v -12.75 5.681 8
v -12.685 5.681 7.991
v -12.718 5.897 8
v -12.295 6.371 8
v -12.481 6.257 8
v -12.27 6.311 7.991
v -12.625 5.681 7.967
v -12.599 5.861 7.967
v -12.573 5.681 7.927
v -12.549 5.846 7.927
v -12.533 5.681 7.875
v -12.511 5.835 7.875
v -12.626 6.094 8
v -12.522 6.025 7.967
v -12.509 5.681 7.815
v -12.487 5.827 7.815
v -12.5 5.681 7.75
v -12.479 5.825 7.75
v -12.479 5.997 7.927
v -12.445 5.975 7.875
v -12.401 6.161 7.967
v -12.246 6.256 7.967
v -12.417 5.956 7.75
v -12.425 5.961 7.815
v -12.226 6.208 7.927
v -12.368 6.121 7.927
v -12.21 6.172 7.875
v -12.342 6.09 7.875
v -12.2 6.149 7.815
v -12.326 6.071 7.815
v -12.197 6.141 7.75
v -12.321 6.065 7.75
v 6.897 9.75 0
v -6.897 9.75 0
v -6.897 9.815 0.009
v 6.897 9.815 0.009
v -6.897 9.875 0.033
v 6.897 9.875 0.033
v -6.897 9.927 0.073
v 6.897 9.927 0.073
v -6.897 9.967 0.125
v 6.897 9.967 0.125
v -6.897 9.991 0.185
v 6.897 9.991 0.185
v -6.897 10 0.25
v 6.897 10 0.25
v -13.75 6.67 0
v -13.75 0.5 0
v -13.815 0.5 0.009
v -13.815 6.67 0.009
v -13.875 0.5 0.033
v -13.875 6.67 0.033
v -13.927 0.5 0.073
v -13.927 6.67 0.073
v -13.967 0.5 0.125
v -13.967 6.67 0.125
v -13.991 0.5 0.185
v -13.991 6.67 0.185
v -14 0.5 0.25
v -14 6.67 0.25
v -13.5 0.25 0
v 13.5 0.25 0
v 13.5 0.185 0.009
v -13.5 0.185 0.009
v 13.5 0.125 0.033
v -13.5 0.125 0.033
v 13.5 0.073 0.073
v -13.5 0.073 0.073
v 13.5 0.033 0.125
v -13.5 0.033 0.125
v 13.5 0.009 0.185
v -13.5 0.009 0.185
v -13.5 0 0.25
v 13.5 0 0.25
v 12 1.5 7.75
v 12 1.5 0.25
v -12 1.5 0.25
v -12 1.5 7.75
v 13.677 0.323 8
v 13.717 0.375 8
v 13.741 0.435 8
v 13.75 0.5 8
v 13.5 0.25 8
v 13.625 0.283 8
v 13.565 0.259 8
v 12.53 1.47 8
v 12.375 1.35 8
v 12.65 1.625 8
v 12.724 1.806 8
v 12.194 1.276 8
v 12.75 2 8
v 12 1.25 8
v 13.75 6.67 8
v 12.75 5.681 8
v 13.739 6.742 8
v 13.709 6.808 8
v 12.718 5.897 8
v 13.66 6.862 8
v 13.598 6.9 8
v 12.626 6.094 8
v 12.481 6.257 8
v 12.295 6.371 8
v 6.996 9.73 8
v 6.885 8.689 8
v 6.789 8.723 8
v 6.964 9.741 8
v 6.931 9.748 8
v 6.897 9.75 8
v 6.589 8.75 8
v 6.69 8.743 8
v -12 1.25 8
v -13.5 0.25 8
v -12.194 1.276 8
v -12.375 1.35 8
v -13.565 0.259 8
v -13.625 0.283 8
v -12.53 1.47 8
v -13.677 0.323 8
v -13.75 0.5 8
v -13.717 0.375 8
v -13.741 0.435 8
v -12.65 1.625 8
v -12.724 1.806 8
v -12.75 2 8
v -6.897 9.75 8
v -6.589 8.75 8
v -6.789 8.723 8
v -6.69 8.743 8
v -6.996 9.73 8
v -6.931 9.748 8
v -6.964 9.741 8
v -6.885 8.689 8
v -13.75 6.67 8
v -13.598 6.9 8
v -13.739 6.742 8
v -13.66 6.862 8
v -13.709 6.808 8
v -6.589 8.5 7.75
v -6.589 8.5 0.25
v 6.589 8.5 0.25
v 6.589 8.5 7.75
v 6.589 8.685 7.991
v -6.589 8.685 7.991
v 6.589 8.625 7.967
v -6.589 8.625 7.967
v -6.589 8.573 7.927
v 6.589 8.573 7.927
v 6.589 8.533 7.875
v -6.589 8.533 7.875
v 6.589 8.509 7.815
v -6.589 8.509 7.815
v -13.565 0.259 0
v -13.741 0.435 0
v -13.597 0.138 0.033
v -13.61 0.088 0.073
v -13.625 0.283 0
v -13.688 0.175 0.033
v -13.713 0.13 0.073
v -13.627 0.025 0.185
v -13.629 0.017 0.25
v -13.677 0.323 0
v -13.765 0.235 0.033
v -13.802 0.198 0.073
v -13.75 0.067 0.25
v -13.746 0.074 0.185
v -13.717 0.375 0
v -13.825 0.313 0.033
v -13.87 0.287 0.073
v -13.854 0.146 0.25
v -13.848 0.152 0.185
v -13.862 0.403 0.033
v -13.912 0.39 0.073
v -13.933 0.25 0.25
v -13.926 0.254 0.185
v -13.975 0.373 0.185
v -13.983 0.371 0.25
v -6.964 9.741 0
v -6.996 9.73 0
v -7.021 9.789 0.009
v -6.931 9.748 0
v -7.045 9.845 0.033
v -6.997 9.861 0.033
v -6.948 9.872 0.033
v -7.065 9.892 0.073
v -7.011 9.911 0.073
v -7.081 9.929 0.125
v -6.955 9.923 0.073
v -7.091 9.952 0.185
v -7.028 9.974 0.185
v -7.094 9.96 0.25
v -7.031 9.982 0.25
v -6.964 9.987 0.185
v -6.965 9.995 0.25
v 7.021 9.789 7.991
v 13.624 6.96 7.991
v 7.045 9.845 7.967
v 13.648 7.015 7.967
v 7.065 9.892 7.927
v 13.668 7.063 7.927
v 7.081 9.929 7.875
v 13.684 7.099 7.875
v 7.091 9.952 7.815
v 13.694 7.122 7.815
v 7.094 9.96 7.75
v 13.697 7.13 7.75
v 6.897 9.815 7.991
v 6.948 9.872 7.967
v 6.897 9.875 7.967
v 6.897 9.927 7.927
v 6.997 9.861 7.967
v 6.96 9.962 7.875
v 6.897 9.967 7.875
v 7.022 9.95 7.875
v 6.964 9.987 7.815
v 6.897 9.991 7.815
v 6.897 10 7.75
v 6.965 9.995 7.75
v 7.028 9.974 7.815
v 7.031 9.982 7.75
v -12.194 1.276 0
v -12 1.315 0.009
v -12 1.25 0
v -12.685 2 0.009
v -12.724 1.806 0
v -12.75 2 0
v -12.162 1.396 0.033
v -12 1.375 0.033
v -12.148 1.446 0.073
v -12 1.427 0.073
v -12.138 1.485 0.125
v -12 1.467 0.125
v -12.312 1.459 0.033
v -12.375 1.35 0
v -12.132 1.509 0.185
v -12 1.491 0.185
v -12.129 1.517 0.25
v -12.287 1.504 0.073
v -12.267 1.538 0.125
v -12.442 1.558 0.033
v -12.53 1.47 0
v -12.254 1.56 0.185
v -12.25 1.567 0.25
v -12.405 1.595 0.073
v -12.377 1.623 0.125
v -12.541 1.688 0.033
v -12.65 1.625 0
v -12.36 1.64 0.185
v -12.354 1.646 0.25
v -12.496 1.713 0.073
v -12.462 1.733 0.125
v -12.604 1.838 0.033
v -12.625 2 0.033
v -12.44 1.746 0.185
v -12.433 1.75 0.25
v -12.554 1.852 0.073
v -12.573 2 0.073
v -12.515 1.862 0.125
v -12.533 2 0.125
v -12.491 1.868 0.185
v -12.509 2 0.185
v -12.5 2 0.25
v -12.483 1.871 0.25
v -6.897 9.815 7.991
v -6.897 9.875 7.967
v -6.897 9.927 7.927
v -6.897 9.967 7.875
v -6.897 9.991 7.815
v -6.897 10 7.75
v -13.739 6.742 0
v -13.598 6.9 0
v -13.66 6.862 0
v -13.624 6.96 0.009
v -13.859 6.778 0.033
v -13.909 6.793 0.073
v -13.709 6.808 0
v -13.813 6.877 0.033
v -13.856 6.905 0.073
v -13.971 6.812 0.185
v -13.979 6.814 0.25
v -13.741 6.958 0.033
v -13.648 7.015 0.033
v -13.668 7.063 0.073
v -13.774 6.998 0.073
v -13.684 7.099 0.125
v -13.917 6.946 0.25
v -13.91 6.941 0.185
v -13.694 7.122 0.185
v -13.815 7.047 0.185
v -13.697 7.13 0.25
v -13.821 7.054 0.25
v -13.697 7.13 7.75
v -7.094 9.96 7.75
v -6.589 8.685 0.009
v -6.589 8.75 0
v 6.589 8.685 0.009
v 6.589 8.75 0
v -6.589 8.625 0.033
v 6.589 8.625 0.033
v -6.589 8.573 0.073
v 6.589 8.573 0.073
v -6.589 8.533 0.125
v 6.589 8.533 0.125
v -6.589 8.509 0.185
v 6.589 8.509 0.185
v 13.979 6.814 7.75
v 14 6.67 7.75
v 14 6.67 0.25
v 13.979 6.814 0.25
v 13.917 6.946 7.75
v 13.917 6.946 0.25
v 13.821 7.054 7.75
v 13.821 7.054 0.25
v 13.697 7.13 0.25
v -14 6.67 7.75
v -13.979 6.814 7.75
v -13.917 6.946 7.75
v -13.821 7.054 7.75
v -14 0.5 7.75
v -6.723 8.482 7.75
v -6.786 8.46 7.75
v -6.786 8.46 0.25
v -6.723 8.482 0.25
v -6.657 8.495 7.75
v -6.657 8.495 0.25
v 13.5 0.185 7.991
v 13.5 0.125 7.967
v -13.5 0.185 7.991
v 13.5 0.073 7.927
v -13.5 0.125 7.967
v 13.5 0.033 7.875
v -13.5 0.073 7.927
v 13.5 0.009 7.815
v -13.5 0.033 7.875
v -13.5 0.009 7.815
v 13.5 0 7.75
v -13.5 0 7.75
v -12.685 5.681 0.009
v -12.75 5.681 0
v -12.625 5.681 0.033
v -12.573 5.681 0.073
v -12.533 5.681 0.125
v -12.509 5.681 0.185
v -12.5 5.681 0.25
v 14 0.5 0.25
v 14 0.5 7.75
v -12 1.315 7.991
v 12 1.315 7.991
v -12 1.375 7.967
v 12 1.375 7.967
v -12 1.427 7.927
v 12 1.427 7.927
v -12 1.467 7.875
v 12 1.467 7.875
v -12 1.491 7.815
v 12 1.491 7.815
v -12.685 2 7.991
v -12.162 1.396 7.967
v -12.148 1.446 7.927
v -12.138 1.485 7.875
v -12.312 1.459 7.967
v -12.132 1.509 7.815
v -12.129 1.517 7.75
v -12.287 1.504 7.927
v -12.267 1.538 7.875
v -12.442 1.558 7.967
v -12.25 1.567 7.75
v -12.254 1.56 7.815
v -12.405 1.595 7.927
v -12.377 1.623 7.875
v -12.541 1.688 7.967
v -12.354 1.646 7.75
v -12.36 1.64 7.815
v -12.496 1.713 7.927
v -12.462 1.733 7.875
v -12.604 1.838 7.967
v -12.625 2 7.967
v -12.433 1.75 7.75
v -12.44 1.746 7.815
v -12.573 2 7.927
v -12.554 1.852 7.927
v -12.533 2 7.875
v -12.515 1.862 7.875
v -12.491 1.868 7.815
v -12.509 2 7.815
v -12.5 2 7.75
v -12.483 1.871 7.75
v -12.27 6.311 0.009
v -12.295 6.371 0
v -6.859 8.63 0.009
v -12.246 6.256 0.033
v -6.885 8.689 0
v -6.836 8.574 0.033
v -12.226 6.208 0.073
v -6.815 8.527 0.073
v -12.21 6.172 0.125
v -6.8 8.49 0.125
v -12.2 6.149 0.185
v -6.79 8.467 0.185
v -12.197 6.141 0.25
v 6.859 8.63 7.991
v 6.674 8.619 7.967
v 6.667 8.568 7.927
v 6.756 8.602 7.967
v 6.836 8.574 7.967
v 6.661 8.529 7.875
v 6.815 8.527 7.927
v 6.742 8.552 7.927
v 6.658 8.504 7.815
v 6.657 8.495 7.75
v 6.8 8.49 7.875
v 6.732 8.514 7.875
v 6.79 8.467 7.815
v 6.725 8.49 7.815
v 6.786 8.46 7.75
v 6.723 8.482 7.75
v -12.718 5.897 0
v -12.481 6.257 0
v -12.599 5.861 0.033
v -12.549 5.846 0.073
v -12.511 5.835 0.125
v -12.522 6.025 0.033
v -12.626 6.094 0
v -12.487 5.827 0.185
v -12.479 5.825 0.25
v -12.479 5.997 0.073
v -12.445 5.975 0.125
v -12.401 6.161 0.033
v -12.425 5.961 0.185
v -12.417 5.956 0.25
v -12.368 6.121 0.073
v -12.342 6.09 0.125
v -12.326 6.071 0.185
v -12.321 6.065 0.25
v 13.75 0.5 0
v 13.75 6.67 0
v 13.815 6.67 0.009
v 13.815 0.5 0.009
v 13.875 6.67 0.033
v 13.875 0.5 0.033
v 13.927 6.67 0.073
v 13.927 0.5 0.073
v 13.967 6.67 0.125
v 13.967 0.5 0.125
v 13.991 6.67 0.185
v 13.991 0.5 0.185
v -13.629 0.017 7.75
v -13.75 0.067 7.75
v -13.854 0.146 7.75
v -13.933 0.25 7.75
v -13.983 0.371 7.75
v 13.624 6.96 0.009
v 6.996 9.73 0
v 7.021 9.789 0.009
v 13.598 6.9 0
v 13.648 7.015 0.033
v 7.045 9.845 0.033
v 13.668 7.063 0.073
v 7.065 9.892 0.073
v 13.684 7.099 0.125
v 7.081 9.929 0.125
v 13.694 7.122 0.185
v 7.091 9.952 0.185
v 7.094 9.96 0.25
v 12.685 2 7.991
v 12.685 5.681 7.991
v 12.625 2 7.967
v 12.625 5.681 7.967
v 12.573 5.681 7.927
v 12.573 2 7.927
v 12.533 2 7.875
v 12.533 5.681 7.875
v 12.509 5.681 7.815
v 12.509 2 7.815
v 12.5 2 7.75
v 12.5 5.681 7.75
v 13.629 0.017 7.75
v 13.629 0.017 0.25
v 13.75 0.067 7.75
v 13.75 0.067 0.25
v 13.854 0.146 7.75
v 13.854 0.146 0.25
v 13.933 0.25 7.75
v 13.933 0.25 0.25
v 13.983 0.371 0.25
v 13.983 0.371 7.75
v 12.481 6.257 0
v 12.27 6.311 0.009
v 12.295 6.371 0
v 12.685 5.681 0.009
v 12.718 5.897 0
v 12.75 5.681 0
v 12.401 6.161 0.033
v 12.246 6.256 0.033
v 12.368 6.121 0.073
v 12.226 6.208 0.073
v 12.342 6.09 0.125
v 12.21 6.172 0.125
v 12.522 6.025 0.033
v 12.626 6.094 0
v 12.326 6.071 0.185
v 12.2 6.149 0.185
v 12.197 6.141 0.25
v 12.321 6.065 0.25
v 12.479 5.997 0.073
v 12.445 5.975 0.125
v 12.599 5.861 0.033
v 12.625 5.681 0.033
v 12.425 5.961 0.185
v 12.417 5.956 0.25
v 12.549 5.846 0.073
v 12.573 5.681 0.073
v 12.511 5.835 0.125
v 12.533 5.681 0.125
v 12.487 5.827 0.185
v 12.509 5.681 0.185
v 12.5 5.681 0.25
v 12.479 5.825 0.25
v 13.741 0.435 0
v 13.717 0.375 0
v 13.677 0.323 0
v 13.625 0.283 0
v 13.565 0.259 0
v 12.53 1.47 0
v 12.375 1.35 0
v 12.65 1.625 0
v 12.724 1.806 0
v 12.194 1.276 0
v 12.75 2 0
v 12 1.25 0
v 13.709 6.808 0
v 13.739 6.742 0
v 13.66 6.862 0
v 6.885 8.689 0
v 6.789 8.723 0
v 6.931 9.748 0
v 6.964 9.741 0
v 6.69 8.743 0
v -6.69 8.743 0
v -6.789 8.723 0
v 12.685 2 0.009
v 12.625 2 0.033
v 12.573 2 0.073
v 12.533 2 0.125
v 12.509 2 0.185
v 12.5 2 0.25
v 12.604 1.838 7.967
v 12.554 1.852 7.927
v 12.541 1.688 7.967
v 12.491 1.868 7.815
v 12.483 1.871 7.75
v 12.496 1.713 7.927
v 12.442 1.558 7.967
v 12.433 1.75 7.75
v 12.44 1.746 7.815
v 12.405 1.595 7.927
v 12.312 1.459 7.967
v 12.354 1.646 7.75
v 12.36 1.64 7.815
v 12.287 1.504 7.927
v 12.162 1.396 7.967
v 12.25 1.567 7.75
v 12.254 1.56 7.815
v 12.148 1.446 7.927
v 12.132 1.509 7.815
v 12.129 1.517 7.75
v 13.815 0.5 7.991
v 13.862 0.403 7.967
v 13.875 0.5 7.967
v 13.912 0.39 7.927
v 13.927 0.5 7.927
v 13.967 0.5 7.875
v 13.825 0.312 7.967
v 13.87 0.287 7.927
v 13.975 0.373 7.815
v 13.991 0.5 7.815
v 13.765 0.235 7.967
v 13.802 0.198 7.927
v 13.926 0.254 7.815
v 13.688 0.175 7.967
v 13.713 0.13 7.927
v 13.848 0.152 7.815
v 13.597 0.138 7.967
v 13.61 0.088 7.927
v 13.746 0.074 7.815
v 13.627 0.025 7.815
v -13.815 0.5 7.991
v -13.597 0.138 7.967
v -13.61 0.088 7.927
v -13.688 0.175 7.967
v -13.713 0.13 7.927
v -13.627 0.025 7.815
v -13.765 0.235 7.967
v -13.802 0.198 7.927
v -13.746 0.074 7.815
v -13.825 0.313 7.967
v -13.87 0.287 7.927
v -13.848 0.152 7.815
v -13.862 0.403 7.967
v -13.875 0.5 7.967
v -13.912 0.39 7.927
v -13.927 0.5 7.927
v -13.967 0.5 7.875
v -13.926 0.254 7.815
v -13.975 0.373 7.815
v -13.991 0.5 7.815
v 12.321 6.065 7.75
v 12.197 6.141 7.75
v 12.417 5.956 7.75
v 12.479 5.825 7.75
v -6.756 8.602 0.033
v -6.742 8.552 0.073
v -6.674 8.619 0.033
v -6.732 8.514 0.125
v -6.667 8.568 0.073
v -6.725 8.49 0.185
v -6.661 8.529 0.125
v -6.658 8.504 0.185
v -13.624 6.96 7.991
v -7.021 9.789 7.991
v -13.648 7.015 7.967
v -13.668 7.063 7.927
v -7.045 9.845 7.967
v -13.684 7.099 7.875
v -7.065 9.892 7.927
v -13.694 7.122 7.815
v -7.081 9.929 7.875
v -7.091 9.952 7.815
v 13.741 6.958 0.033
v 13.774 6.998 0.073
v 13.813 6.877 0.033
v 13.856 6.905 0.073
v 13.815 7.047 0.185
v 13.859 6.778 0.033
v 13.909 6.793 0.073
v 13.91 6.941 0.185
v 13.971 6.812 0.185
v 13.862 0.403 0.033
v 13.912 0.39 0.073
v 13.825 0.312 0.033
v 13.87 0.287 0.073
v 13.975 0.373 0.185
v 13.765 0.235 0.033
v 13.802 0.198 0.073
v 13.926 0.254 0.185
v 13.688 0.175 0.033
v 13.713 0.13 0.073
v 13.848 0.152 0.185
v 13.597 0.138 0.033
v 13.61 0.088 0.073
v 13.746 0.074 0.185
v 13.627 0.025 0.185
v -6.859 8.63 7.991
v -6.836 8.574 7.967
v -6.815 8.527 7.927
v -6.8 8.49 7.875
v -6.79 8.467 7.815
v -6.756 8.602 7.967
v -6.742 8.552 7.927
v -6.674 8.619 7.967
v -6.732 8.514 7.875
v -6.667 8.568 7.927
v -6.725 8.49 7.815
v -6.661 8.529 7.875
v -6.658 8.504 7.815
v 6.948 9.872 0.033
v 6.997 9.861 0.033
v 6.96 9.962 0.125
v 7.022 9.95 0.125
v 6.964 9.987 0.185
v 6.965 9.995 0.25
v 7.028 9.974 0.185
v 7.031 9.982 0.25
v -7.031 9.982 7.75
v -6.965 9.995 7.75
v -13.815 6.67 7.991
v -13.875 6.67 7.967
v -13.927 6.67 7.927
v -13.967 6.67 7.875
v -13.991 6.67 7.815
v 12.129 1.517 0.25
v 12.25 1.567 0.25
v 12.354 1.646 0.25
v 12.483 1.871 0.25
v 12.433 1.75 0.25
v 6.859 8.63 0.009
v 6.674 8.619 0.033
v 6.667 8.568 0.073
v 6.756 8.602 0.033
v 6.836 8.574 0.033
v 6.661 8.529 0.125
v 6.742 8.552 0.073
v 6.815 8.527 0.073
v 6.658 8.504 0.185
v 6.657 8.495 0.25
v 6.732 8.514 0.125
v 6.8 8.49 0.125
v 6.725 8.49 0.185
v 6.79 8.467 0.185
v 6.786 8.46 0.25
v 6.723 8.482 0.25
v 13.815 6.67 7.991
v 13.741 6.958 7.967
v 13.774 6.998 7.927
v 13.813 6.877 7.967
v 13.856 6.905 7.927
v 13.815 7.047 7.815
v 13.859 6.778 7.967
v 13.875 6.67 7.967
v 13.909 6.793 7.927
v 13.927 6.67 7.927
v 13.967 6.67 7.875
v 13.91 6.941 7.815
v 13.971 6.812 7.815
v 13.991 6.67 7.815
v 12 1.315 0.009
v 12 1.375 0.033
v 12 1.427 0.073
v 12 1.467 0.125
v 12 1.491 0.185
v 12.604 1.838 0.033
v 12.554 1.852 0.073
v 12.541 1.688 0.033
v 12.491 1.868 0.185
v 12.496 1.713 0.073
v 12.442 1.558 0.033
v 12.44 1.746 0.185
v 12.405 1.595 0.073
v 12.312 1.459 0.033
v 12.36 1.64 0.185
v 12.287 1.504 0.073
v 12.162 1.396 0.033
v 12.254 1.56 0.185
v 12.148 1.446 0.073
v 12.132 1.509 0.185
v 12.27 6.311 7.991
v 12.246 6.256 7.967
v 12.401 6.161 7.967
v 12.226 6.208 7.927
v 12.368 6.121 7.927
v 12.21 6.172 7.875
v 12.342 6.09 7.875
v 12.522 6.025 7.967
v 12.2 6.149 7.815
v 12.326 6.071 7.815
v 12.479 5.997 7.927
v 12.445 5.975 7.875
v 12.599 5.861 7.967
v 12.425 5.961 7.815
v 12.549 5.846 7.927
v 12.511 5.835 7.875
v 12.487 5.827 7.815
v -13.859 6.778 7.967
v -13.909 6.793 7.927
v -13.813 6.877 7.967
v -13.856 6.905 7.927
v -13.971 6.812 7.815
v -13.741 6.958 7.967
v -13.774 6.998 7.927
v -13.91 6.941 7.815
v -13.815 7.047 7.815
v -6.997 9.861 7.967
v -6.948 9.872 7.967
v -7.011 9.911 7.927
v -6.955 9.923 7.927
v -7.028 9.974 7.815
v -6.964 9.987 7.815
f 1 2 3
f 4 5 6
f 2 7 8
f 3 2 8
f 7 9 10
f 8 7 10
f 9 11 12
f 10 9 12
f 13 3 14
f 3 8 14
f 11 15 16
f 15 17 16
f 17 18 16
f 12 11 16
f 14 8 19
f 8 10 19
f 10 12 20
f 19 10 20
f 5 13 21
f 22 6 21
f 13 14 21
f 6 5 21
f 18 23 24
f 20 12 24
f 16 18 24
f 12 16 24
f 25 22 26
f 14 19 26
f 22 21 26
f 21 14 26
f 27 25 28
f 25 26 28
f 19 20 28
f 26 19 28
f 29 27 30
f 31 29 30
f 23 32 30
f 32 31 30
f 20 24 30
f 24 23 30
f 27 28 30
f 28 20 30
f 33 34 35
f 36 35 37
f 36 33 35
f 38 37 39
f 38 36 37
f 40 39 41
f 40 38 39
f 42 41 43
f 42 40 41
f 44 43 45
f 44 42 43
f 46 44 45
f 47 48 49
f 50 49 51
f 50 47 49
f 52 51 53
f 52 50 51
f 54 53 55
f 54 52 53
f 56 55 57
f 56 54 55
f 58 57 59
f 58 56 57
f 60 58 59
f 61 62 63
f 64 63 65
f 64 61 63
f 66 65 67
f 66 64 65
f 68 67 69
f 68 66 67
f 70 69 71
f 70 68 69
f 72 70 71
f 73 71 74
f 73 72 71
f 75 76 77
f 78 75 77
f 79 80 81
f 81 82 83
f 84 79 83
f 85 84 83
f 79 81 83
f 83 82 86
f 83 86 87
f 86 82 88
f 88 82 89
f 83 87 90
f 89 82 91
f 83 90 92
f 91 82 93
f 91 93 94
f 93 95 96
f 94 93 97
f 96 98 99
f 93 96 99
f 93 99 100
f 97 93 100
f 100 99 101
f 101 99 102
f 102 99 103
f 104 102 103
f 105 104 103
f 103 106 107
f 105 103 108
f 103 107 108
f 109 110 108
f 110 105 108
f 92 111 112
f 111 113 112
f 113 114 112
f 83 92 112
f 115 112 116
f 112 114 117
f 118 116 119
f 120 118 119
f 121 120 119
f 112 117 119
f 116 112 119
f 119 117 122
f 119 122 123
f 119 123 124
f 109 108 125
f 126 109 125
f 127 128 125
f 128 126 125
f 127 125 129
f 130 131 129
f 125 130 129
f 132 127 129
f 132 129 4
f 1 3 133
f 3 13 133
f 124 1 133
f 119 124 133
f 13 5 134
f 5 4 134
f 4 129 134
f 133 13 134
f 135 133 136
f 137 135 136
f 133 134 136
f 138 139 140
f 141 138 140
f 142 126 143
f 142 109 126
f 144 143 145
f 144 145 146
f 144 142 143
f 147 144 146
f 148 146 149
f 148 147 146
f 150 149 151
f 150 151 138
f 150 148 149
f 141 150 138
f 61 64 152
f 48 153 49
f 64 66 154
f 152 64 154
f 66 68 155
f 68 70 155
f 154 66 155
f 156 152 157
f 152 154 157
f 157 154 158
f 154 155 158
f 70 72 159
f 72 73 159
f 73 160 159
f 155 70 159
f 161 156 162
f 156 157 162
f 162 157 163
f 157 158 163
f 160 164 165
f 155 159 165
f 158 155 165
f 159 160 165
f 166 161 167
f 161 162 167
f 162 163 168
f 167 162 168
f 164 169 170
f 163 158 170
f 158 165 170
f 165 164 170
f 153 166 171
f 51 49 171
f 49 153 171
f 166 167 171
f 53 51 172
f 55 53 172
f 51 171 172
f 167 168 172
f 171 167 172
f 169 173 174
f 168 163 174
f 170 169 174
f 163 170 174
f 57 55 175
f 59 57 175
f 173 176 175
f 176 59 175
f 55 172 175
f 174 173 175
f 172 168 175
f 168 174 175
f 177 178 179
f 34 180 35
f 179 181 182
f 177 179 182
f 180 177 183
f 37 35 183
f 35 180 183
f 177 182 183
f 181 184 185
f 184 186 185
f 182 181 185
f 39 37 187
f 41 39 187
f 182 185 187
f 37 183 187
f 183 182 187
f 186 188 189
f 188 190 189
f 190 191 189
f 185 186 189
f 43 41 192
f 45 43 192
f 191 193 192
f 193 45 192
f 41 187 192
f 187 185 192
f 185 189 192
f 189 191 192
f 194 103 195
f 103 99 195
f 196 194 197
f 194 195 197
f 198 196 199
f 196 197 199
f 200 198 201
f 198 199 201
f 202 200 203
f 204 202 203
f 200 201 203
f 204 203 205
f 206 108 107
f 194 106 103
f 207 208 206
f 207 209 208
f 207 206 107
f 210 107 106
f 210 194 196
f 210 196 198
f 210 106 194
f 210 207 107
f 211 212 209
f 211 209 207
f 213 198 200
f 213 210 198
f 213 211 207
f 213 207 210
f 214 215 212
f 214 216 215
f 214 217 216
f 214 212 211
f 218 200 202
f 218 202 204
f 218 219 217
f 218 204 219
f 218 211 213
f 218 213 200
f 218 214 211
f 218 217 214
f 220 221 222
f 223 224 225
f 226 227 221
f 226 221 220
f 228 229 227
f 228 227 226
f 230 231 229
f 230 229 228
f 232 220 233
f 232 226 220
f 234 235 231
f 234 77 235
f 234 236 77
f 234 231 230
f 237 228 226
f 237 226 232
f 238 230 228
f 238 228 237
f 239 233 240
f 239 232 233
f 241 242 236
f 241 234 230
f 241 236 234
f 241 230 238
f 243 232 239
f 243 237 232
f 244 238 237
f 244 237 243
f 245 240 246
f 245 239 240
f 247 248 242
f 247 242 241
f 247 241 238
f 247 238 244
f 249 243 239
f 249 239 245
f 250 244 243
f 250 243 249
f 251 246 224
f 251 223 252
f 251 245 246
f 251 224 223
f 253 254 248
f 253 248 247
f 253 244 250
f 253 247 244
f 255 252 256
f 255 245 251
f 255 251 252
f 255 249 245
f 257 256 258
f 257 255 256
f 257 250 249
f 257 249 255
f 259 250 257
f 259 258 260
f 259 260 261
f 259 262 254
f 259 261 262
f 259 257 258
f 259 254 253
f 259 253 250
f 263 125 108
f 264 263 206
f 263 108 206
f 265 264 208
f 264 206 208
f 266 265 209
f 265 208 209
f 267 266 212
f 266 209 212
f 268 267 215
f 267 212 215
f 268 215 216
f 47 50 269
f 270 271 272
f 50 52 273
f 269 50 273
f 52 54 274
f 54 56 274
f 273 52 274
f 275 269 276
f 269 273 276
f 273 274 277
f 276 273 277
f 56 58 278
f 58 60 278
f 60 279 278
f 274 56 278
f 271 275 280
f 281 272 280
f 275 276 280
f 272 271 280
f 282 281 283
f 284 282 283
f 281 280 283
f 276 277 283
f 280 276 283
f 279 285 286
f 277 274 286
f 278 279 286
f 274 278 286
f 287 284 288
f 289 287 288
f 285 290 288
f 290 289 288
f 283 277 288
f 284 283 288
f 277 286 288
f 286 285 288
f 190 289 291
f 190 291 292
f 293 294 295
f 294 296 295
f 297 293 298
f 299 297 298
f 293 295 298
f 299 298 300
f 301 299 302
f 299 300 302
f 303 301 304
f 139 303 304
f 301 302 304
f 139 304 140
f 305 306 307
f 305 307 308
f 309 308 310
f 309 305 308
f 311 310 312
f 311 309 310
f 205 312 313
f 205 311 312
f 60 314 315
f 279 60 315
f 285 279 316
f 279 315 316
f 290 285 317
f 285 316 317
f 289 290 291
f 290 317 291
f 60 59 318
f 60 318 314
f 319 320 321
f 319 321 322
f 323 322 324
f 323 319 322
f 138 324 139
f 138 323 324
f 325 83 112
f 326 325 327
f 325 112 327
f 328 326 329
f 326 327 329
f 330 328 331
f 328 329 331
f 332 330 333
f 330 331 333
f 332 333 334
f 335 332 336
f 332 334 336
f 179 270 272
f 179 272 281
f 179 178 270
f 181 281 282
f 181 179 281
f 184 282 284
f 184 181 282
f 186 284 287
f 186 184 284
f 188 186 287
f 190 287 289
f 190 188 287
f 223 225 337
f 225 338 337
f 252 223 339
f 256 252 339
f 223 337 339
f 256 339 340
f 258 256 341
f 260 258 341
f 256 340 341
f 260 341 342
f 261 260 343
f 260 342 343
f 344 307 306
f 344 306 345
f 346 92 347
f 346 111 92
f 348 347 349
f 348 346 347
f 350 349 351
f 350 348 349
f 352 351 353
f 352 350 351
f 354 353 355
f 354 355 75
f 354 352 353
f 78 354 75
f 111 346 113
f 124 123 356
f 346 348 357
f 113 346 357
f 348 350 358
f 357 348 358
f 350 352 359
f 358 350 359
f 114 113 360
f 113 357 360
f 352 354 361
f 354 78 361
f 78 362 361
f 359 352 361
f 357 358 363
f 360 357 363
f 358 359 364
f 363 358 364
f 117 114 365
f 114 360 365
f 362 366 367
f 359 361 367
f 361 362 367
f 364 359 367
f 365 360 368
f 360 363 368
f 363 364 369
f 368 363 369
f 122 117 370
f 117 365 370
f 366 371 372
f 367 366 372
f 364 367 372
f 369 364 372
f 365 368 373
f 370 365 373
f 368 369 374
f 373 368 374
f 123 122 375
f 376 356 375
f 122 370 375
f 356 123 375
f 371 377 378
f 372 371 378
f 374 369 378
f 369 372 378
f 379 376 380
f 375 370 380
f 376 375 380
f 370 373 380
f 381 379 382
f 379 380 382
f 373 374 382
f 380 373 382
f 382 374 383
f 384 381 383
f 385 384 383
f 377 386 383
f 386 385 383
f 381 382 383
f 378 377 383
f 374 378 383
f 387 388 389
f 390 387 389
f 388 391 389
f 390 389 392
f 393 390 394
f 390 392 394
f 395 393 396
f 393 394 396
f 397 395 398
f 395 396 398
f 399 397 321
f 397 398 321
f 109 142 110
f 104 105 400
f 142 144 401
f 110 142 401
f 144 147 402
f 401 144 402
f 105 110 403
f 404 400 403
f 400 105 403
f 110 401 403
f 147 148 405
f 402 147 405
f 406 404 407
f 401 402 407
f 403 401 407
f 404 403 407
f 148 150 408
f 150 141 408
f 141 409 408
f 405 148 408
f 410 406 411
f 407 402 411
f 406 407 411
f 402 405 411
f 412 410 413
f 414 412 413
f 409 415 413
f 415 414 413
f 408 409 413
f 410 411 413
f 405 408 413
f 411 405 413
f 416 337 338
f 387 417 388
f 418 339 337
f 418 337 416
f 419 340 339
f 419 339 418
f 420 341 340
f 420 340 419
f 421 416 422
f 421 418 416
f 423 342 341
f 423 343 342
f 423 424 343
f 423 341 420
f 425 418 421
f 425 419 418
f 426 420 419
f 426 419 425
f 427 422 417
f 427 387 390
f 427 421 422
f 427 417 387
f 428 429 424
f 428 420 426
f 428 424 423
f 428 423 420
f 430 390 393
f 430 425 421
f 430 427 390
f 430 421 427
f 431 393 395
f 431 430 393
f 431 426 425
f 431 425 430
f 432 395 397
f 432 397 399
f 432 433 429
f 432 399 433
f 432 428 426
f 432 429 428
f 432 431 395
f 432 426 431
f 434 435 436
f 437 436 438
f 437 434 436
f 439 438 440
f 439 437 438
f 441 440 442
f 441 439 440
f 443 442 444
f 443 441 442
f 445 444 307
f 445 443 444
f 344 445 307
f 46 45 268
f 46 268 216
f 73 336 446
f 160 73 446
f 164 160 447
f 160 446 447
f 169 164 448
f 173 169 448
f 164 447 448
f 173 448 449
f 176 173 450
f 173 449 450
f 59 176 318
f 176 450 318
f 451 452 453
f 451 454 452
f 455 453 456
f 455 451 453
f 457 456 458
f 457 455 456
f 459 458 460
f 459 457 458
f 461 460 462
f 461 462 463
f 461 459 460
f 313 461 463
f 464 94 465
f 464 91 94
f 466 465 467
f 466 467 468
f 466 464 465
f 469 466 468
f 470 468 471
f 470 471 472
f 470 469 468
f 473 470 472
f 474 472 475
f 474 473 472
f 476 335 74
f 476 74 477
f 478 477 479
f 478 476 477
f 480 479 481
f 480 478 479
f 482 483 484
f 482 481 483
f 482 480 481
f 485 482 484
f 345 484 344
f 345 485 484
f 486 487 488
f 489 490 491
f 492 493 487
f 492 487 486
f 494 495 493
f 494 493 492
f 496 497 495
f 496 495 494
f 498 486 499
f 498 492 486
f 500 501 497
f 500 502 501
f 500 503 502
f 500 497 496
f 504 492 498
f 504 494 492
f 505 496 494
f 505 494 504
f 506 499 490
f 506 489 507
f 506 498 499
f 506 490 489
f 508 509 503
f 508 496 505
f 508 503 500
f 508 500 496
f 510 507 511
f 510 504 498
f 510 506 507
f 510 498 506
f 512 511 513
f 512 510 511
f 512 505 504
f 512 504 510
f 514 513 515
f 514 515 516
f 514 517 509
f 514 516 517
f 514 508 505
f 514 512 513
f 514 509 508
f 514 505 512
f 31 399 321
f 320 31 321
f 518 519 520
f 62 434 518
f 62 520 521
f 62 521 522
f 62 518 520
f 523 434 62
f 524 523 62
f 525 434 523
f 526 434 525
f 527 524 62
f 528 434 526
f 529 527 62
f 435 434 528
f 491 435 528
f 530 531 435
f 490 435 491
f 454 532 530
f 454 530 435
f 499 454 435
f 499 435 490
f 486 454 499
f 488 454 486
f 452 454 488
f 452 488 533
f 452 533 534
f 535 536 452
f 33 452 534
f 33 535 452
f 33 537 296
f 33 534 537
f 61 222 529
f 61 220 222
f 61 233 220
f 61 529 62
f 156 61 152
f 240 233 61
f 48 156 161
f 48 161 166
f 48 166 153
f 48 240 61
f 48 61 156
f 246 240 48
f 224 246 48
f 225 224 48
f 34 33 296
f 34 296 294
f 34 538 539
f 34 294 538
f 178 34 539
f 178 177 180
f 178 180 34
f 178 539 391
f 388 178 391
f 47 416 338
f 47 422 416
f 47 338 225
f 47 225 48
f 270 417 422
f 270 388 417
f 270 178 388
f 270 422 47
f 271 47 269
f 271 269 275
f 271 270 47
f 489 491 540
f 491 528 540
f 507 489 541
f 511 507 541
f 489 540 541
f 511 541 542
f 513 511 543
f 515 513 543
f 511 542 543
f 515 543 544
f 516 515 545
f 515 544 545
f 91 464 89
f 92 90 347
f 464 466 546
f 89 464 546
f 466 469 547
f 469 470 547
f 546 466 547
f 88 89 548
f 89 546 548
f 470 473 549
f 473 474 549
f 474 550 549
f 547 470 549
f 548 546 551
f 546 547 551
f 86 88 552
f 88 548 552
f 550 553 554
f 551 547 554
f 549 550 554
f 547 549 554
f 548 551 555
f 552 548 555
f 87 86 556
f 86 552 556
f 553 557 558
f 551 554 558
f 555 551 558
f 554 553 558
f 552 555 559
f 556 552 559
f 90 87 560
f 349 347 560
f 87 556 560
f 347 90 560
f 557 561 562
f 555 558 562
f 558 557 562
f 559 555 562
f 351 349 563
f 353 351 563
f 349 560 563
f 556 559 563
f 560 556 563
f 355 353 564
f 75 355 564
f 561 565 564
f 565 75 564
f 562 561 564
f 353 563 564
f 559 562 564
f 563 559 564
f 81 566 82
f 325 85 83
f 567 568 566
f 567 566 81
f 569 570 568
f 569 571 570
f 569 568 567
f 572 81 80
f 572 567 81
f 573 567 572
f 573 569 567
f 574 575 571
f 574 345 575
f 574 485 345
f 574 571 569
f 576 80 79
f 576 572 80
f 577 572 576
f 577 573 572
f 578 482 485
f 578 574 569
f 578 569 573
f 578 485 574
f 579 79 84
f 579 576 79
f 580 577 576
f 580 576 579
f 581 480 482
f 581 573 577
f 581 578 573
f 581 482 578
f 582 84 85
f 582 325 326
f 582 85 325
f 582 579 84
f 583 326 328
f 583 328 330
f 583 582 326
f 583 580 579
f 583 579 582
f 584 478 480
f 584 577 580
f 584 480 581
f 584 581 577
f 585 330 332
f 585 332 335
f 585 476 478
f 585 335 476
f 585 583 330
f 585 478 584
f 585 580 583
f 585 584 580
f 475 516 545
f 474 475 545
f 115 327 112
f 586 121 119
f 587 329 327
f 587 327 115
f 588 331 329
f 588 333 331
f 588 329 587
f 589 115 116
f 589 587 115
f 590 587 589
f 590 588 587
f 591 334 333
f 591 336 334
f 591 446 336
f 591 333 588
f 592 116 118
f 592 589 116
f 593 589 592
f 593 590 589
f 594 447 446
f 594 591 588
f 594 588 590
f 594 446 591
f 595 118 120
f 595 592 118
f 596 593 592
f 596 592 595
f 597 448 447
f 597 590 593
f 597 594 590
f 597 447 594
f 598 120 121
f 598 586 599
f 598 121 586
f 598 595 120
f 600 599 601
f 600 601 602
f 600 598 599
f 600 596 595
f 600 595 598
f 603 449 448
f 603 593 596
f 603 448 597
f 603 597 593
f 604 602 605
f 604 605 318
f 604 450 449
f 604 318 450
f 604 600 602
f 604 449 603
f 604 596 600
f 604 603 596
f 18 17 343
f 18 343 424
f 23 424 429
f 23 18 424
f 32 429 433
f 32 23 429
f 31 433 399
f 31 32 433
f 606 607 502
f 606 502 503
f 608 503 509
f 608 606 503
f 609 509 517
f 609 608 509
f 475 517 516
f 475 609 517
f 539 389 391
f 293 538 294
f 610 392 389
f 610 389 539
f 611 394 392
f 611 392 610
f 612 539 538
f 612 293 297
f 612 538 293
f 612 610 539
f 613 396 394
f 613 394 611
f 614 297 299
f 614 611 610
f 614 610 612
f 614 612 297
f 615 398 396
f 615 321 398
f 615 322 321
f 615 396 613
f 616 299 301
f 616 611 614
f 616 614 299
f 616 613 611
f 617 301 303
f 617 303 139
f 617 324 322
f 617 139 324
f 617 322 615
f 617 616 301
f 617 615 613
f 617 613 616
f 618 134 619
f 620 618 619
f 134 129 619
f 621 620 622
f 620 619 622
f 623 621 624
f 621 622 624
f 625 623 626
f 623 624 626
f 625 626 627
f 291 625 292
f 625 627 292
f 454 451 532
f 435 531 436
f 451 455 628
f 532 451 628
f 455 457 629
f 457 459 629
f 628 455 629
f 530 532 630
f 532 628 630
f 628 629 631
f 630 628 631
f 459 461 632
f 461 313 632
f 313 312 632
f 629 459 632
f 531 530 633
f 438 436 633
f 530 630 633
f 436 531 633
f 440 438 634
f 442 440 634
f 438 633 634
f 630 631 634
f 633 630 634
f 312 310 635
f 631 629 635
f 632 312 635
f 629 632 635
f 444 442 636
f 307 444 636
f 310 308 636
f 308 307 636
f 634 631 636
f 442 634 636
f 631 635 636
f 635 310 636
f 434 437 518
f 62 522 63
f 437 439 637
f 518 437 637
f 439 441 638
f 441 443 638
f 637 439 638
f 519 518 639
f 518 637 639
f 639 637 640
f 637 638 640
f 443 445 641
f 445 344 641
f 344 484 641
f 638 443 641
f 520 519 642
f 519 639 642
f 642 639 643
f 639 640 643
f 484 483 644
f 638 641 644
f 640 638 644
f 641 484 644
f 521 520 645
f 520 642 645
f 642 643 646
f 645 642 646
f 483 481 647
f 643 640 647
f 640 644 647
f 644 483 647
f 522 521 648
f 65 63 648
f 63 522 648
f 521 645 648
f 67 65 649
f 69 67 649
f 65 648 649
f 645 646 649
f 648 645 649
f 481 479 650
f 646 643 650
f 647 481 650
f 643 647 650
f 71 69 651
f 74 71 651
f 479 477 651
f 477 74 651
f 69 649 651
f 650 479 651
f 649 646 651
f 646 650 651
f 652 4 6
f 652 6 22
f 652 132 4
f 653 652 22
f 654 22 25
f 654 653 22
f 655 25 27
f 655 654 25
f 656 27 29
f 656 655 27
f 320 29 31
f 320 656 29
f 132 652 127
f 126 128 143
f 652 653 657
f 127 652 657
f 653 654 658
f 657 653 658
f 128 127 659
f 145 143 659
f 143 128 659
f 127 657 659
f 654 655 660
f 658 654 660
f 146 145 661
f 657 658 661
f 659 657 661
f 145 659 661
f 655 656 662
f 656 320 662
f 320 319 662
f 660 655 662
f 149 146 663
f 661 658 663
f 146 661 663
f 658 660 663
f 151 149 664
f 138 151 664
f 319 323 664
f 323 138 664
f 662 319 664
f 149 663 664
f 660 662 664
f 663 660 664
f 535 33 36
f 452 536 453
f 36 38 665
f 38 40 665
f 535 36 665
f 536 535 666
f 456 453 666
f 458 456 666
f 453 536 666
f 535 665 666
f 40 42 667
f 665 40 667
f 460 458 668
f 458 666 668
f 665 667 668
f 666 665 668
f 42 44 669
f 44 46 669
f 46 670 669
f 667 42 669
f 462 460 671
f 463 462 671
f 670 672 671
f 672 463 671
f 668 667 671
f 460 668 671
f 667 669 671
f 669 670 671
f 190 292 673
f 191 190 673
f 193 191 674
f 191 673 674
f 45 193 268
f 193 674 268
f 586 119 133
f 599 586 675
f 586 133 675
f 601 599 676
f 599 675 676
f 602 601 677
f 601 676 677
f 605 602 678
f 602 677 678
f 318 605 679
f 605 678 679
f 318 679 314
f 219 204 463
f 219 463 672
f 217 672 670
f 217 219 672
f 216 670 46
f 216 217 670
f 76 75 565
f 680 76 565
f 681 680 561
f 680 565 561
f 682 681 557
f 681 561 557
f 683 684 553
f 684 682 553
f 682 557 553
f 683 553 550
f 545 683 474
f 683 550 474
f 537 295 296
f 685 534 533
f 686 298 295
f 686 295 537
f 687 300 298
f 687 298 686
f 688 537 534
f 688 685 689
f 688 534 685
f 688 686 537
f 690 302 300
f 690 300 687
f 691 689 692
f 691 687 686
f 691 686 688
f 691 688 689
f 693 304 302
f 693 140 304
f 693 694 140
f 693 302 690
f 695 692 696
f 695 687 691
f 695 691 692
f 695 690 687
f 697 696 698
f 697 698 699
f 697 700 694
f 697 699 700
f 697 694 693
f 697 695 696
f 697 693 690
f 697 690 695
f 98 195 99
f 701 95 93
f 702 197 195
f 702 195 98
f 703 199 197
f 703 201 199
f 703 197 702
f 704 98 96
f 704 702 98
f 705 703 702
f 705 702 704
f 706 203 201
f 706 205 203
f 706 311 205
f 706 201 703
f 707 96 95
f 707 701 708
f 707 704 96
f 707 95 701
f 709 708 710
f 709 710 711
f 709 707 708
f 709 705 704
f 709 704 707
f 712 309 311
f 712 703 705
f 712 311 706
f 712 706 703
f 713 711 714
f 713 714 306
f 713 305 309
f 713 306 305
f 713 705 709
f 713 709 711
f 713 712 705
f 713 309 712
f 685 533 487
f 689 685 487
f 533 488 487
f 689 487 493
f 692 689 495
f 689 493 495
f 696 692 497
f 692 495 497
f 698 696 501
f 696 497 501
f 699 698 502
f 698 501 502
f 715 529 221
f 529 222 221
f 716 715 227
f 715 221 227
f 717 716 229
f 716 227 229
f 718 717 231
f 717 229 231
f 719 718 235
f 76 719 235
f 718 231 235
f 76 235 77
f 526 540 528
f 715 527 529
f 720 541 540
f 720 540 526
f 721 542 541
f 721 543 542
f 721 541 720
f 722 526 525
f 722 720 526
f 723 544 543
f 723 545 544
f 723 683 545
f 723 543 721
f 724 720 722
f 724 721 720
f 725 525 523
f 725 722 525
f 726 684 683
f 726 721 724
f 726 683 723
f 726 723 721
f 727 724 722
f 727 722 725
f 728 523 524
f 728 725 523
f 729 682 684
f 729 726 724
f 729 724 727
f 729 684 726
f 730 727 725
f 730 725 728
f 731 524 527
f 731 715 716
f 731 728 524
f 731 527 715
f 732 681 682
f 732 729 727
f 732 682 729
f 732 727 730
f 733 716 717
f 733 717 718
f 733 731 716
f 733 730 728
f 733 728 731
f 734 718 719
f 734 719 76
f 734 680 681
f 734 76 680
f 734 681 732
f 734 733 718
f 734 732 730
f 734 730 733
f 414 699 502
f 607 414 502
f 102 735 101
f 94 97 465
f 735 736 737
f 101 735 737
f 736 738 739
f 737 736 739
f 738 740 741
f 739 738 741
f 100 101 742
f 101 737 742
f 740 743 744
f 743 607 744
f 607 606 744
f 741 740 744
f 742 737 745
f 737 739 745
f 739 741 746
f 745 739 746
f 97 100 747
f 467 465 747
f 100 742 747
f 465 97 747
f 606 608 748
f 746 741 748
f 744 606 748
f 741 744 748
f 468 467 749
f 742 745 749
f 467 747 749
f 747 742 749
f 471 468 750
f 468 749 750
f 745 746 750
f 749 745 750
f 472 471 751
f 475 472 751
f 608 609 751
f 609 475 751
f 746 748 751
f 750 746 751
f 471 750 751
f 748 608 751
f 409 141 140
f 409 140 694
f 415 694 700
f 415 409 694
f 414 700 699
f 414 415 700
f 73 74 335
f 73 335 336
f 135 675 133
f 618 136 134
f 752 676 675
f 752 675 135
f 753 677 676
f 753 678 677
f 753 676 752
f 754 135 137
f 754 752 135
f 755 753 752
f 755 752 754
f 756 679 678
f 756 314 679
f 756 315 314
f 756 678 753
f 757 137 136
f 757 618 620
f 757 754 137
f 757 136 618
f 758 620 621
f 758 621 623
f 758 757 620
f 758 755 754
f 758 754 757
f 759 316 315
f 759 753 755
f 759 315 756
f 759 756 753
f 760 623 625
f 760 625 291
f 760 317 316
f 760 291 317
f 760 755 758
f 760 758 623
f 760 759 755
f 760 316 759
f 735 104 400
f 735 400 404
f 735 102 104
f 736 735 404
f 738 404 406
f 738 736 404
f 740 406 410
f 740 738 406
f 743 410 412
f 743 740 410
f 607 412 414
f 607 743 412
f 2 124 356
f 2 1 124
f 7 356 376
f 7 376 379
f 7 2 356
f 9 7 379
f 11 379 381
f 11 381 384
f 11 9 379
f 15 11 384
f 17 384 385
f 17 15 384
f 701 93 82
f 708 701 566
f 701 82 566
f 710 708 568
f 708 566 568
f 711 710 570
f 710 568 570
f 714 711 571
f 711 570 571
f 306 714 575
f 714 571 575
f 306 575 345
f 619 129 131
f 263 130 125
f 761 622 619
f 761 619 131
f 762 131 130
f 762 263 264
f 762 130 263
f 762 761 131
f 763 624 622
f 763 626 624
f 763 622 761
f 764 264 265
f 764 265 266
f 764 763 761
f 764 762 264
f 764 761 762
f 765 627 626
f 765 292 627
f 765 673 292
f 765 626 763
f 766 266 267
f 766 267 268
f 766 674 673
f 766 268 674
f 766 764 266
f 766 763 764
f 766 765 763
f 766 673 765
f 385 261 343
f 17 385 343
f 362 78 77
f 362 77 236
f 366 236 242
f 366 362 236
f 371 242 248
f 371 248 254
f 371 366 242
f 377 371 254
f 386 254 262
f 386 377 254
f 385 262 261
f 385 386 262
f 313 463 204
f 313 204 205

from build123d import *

# Parameters (mm, degrees)
BOSS_EXTRUDE1_DEPTH = 8
FILLET1_R           = 0.5
FILLET2_R           = 0.25


with BuildPart() as part:
    # Sketch1 → Boss-Extrude1 (new body)
    with BuildSketch(Plane.XY):
        Polygon((14, 0), (-14, 0), (-14, 7), (-7, 10), (7, 10), (14, 7), align=None)
        Polygon((12.5, 1.5), (-12.5, 1.5), (-12.5, 6.010905763), (-6.692113447, 8.5), (6.692113447, 8.5), (12.5, 6.010905763), align=None, mode=Mode.SUBTRACT)
    extrude(amount=BOSS_EXTRUDE1_DEPTH)

    # Fillet1
    fillet1_edges = [part.edges().sort_by_distance(p)[0] for p in [
        (14, 0, 4),
        (-14, 0, 4),
        (-14, 7, 4),
        (-7, 10, 4),
        (7, 10, 4),
        (14, 7, 4),
        (12.5, 1.5, 4),
        (12.5, 6.010905763, 4),
        (6.692113447, 8.5, 4),
        (-6.692113447, 8.5, 4),
        (-12.5, 6.010905763, 4),
        (-12.5, 1.5, 4),
    ]]
    fillet(fillet1_edges, radius=FILLET1_R)

    # Fillet2
    fillet2_edges = [part.edges().sort_by_distance(p)[0] for p in [
        (0, 1.5, 0),
        (0, 1.5, 8),
        (12.5, 3.840603842, 0),
        (12.5, 3.840603842, 8),
        (9.491701947, 7.300176357, 0),
        (9.491701947, 7.300176357, 8),
        (0, 8.5, 0),
        (0, 8.5, 8),
        (-9.491701947, 7.300176357, 0),
        (-9.491701947, 7.300176357, 8),
        (-12.5, 3.840603842, 0),
        (-12.5, 3.840603842, 8),
        (10.395645224, 8.544723476, 0),
        (10.395645224, 8.544723476, 8),
        (14, 3.585150961, 0),
        (0, 0, 0),
        (-14, 3.585150961, 0),
        (-10.395645224, 8.544723476, 0),
        (0, 10, 0),
        (6.997904085, 9.989788861, 0),
        (-6.997904085, 9.989788861, 0),
        (-13.917420546, 6.945547425, 0),
        (-13.853553391, 0.146446609, 0),
        (13.853553391, 0.146446609, 0),
        (13.917420546, 6.945547425, 0),
        (14, 3.585150961, 8),
        (0, 10, 8),
        (-10.395645224, 8.544723476, 8),
        (-14, 3.585150961, 8),
        (0, 0, 8),
        (6.997904085, 9.989788861, 8),
        (-6.997904085, 9.989788861, 8),
        (-13.917420546, 6.945547425, 8),
        (-13.853553391, 0.146446609, 8),
        (13.853553391, 0.146446609, 8),
        (13.917420546, 6.945547425, 8),
        (12.353553391, 1.646446609, 0),
        (12.353553391, 1.646446609, 8),
        (12.417420546, 5.956453188, 0),
        (12.417420546, 5.956453188, 8),
        (6.690017532, 8.489788861, 0),
        (6.690017532, 8.489788861, 8),
        (-6.690017532, 8.489788861, 0),
        (-6.690017532, 8.489788861, 8),
        (-12.417420546, 5.956453188, 0),
        (-12.417420546, 5.956453188, 8),
        (-12.353553391, 1.646446609, 0),
        (-12.353553391, 1.646446609, 8),
    ]]
    fillet(fillet2_edges, radius=FILLET2_R)


solid = part.part
